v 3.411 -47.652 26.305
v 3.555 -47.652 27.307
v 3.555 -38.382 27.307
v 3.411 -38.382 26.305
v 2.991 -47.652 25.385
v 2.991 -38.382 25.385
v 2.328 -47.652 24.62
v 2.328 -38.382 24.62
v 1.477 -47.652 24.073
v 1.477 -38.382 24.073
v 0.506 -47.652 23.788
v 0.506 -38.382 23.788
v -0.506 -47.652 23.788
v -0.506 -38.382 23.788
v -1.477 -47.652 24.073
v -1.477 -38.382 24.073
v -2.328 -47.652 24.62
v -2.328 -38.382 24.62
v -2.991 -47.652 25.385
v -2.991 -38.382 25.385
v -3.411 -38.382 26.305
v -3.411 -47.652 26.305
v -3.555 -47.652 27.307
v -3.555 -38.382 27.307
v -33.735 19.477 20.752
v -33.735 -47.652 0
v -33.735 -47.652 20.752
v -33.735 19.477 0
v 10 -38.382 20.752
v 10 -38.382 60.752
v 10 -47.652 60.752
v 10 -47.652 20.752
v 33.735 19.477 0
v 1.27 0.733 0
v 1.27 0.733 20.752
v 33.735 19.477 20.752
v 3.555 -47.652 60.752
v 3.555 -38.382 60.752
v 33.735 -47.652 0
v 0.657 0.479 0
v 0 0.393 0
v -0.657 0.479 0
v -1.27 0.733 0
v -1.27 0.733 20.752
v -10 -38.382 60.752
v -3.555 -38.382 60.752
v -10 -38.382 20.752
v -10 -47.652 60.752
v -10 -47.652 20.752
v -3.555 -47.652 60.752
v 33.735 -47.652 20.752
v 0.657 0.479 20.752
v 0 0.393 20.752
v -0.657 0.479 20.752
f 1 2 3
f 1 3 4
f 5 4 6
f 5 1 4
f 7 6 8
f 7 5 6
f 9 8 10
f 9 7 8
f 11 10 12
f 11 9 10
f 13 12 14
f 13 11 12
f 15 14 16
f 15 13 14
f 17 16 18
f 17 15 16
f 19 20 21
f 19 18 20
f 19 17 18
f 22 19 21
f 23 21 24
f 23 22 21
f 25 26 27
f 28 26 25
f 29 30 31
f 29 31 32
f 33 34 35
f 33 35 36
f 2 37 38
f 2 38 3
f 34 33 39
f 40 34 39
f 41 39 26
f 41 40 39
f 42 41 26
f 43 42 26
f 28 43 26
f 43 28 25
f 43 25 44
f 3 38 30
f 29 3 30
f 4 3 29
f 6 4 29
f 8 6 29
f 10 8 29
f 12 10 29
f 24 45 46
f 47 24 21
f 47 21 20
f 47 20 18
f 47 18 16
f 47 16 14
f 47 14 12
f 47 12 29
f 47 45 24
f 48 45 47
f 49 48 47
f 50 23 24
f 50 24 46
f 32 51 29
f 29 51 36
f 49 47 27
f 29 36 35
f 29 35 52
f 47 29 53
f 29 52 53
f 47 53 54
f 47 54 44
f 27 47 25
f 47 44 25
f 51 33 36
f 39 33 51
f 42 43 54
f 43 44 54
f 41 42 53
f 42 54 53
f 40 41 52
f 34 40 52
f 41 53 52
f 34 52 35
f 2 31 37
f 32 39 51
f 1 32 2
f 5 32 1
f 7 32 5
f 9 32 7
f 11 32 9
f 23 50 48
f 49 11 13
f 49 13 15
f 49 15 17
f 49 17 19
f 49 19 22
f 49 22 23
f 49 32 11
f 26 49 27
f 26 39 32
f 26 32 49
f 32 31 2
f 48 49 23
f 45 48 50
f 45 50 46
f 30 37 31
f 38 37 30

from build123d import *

# Parameters (mm, degrees)
BOSS_EXTRUDE1_DEPTH      = 20.7518
BOSS_EXTRUDE3_DEPTH      = 10
BOSS_EXTRUDE3_DEPTH_BACK = 10
SKETCH6_W                = 40
SKETCH6_H                = 9.27
FILLET1_R                = 2.54
CUT_EXTRUDE11_START      = -47.652475
CUT_EXTRUDE11_DEPTH      = 10


with BuildPart() as part:
    # Sketch1 → Boss-Extrude1 (new body)
    with BuildSketch(Plane.XY):
        Polygon((-33.735, 19.476911331), (0, 0), (33.735, 19.476911331), (33.735, -47.652474646), (-33.735, -47.652474646), align=None)
    extrude(amount=BOSS_EXTRUDE1_DEPTH)

    # Sketch6 → Boss-Extrude3 (add, two sides: drawn at the far end of the back side and taken through both)
    with BuildSketch(Plane(origin=(0, 0, 0), x_dir=(0, 0, -1), z_dir=(1, 0, 0)).offset(-BOSS_EXTRUDE3_DEPTH_BACK)):
        with Locations((-40.7518, -43.017474646)):
            Rectangle(SKETCH6_W, SKETCH6_H)
    extrude(amount=BOSS_EXTRUDE3_DEPTH + BOSS_EXTRUDE3_DEPTH_BACK)

    # Fillet1
    fillet1_edges = [part.edges().sort_by_distance(p)[0] for p in [
        (0, 0, 10.3759),
    ]]
    fillet(fillet1_edges, radius=FILLET1_R)

    # Sketch7 → Cut-Extrude11 (cut)
    with BuildSketch(Plane(origin=(0, 0, 0), x_dir=(1, 0, 0), z_dir=(0, 1, 0)).offset(CUT_EXTRUDE11_START)):
        with BuildLine():
            Line((-3.555, -27.3068), (-3.555, -94.1968))
            ThreePointArc((-3.555, -94.1968), (0, -97.7518), (3.555, -94.1968))
            Line((3.555, -94.1968), (3.555, -27.3068))
            ThreePointArc((3.555, -27.3068), (0, -23.7518), (-3.555, -27.3068))
        make_face()
    extrude(amount=CUT_EXTRUDE11_DEPTH, mode=Mode.SUBTRACT)


solid = part.part
